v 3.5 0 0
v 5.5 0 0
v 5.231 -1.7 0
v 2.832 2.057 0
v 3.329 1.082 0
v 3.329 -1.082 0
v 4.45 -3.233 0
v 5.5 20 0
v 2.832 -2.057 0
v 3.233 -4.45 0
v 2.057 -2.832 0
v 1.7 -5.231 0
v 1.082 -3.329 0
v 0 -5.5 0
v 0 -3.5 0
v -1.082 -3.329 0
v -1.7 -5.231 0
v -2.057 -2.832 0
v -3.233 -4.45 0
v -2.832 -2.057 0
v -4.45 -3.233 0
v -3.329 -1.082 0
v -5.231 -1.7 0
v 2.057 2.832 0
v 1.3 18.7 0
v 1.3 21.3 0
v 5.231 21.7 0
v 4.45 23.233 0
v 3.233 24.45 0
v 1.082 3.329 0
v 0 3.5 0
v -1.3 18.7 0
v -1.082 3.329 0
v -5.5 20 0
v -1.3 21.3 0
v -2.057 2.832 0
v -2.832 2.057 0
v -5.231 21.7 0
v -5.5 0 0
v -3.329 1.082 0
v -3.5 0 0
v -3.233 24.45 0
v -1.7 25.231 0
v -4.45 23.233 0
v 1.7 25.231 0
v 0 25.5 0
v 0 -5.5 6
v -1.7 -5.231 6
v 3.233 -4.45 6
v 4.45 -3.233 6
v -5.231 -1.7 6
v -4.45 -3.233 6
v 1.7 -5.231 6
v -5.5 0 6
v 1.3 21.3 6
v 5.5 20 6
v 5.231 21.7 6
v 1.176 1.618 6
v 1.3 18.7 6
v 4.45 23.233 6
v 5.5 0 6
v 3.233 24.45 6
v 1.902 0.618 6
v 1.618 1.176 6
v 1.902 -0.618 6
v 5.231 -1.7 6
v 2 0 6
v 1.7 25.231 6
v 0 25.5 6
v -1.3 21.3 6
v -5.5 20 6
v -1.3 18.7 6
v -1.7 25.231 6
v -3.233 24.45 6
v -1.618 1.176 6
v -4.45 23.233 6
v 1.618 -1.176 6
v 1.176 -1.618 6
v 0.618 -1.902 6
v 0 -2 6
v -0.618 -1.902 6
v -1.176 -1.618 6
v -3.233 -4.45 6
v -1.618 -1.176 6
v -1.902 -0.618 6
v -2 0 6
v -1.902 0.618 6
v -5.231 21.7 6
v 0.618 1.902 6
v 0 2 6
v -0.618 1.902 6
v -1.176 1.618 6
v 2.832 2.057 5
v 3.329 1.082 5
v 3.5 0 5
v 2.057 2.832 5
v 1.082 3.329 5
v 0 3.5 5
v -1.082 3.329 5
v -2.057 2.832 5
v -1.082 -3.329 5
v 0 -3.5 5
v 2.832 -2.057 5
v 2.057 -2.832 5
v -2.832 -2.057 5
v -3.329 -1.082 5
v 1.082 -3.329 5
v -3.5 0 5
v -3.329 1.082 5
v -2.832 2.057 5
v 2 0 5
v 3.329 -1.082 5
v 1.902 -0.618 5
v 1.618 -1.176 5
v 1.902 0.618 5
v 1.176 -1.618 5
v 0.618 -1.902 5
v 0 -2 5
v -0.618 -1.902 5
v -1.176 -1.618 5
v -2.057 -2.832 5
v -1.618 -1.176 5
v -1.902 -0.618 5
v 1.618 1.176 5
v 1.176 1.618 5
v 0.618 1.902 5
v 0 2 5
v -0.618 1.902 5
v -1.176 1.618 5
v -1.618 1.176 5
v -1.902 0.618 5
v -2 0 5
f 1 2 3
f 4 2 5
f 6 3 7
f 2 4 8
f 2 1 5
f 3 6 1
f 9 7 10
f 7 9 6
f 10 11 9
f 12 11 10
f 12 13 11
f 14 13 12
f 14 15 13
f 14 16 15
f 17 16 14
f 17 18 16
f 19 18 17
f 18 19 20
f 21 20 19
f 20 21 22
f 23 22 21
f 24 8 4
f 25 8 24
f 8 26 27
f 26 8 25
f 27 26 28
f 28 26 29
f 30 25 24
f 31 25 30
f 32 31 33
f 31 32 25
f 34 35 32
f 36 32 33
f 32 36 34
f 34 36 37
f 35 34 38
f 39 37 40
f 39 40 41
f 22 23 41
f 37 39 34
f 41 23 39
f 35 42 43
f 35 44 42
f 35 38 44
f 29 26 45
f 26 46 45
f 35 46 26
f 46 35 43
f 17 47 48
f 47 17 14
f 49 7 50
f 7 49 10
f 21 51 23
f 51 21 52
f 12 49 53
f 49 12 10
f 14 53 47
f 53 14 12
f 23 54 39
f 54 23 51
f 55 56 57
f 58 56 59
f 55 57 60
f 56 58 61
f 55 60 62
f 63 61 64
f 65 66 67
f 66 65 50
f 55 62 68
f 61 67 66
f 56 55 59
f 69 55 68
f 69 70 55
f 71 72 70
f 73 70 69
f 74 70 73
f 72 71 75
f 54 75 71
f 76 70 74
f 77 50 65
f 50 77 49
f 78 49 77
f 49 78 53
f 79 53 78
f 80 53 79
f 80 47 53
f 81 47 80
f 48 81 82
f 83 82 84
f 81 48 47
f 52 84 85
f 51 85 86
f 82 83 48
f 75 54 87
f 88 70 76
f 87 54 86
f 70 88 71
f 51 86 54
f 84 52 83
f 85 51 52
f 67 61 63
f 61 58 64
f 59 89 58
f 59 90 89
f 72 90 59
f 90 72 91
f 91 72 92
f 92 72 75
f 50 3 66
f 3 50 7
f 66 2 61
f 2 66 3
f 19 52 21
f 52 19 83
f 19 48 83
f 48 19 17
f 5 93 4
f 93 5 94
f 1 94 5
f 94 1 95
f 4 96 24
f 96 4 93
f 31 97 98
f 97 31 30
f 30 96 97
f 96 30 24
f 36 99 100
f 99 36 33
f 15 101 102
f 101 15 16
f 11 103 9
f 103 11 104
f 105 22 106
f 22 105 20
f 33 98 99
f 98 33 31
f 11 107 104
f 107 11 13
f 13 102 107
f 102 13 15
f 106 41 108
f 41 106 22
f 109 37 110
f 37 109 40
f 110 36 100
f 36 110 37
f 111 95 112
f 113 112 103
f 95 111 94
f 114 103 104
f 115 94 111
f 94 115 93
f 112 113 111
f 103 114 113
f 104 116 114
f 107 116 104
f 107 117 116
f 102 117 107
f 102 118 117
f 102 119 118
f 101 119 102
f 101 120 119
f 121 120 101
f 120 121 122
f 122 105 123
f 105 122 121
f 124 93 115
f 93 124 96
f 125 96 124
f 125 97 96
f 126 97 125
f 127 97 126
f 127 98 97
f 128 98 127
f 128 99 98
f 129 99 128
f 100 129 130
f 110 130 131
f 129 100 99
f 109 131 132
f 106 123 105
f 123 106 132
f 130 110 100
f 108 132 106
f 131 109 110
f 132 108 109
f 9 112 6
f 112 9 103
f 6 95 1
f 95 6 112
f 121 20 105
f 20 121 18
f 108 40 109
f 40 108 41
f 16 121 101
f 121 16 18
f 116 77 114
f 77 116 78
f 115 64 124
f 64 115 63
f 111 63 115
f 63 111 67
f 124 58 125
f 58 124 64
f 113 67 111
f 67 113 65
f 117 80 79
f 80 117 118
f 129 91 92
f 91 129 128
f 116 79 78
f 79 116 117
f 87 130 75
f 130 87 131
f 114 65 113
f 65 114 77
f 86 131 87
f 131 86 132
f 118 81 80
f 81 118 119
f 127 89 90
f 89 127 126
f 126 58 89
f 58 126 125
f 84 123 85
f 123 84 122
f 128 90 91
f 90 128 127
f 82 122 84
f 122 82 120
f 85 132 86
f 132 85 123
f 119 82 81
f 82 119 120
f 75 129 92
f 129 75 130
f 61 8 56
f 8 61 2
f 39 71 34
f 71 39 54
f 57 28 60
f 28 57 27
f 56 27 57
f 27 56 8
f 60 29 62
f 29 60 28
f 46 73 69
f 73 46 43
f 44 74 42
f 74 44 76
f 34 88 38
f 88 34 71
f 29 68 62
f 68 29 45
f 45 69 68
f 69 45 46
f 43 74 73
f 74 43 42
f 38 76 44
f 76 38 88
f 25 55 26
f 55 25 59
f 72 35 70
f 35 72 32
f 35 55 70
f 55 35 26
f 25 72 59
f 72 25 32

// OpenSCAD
$fn=20;

module landingFeet(height, thickness, screwHeadDiameter)
{
    screwDiameter = 4;
    screwHeadHeight = 5;

    difference()
    {
        cylinder(h=height, d = screwHeadDiameter + thickness * 2);

        //Screwhole
        translate([0,0,-1])
        cylinder(h=screwHeadHeight + 1, d=screwHeadDiameter);
        cylinder(h=height + 2, d=screwDiameter);
    }
}

module antennaHolder(height, outsideThickness, screwHeadDiameter, antennaSize)
{
    antennaSize = 2.6;
    width = screwHeadDiameter + outsideThickness * 2;
    length = 20;

    landingFeet(height, outsideThickness, screwHeadDiameter);

    difference()
    {
        union()
        {
            translate([-width / 2, 0, 0])
            {
                cube([width, length, height]);

            }

            translate([0, length, 0])
            cylinder(h=height, d=width);
        }

        cylinder(h=height, d=width);

        //antenna hole
        translate([-antennaSize / 2, length - antennaSize / 2, -1])
        {
            cube([antennaSize, antennaSize, height * 2]);
        }
    }
}

HEIGHT = 6;
THICKNESS = 2;
SCREWHEAD_DIAMETER = 7;

//landingFeet(HEIGHT, THICKNESS, SCREWHEAD_DIAMETER);
//translate([15, 0, 0])
antennaHolder(HEIGHT, THICKNESS, SCREWHEAD_DIAMETER);
//
ANTENNA_HEIGHT = 100;
ANTENNA_WIDTH = 2;

//cube([ANTENNA_HEIGHT, ANTENNA_WIDTH, ANTENNA_WIDTH]);
